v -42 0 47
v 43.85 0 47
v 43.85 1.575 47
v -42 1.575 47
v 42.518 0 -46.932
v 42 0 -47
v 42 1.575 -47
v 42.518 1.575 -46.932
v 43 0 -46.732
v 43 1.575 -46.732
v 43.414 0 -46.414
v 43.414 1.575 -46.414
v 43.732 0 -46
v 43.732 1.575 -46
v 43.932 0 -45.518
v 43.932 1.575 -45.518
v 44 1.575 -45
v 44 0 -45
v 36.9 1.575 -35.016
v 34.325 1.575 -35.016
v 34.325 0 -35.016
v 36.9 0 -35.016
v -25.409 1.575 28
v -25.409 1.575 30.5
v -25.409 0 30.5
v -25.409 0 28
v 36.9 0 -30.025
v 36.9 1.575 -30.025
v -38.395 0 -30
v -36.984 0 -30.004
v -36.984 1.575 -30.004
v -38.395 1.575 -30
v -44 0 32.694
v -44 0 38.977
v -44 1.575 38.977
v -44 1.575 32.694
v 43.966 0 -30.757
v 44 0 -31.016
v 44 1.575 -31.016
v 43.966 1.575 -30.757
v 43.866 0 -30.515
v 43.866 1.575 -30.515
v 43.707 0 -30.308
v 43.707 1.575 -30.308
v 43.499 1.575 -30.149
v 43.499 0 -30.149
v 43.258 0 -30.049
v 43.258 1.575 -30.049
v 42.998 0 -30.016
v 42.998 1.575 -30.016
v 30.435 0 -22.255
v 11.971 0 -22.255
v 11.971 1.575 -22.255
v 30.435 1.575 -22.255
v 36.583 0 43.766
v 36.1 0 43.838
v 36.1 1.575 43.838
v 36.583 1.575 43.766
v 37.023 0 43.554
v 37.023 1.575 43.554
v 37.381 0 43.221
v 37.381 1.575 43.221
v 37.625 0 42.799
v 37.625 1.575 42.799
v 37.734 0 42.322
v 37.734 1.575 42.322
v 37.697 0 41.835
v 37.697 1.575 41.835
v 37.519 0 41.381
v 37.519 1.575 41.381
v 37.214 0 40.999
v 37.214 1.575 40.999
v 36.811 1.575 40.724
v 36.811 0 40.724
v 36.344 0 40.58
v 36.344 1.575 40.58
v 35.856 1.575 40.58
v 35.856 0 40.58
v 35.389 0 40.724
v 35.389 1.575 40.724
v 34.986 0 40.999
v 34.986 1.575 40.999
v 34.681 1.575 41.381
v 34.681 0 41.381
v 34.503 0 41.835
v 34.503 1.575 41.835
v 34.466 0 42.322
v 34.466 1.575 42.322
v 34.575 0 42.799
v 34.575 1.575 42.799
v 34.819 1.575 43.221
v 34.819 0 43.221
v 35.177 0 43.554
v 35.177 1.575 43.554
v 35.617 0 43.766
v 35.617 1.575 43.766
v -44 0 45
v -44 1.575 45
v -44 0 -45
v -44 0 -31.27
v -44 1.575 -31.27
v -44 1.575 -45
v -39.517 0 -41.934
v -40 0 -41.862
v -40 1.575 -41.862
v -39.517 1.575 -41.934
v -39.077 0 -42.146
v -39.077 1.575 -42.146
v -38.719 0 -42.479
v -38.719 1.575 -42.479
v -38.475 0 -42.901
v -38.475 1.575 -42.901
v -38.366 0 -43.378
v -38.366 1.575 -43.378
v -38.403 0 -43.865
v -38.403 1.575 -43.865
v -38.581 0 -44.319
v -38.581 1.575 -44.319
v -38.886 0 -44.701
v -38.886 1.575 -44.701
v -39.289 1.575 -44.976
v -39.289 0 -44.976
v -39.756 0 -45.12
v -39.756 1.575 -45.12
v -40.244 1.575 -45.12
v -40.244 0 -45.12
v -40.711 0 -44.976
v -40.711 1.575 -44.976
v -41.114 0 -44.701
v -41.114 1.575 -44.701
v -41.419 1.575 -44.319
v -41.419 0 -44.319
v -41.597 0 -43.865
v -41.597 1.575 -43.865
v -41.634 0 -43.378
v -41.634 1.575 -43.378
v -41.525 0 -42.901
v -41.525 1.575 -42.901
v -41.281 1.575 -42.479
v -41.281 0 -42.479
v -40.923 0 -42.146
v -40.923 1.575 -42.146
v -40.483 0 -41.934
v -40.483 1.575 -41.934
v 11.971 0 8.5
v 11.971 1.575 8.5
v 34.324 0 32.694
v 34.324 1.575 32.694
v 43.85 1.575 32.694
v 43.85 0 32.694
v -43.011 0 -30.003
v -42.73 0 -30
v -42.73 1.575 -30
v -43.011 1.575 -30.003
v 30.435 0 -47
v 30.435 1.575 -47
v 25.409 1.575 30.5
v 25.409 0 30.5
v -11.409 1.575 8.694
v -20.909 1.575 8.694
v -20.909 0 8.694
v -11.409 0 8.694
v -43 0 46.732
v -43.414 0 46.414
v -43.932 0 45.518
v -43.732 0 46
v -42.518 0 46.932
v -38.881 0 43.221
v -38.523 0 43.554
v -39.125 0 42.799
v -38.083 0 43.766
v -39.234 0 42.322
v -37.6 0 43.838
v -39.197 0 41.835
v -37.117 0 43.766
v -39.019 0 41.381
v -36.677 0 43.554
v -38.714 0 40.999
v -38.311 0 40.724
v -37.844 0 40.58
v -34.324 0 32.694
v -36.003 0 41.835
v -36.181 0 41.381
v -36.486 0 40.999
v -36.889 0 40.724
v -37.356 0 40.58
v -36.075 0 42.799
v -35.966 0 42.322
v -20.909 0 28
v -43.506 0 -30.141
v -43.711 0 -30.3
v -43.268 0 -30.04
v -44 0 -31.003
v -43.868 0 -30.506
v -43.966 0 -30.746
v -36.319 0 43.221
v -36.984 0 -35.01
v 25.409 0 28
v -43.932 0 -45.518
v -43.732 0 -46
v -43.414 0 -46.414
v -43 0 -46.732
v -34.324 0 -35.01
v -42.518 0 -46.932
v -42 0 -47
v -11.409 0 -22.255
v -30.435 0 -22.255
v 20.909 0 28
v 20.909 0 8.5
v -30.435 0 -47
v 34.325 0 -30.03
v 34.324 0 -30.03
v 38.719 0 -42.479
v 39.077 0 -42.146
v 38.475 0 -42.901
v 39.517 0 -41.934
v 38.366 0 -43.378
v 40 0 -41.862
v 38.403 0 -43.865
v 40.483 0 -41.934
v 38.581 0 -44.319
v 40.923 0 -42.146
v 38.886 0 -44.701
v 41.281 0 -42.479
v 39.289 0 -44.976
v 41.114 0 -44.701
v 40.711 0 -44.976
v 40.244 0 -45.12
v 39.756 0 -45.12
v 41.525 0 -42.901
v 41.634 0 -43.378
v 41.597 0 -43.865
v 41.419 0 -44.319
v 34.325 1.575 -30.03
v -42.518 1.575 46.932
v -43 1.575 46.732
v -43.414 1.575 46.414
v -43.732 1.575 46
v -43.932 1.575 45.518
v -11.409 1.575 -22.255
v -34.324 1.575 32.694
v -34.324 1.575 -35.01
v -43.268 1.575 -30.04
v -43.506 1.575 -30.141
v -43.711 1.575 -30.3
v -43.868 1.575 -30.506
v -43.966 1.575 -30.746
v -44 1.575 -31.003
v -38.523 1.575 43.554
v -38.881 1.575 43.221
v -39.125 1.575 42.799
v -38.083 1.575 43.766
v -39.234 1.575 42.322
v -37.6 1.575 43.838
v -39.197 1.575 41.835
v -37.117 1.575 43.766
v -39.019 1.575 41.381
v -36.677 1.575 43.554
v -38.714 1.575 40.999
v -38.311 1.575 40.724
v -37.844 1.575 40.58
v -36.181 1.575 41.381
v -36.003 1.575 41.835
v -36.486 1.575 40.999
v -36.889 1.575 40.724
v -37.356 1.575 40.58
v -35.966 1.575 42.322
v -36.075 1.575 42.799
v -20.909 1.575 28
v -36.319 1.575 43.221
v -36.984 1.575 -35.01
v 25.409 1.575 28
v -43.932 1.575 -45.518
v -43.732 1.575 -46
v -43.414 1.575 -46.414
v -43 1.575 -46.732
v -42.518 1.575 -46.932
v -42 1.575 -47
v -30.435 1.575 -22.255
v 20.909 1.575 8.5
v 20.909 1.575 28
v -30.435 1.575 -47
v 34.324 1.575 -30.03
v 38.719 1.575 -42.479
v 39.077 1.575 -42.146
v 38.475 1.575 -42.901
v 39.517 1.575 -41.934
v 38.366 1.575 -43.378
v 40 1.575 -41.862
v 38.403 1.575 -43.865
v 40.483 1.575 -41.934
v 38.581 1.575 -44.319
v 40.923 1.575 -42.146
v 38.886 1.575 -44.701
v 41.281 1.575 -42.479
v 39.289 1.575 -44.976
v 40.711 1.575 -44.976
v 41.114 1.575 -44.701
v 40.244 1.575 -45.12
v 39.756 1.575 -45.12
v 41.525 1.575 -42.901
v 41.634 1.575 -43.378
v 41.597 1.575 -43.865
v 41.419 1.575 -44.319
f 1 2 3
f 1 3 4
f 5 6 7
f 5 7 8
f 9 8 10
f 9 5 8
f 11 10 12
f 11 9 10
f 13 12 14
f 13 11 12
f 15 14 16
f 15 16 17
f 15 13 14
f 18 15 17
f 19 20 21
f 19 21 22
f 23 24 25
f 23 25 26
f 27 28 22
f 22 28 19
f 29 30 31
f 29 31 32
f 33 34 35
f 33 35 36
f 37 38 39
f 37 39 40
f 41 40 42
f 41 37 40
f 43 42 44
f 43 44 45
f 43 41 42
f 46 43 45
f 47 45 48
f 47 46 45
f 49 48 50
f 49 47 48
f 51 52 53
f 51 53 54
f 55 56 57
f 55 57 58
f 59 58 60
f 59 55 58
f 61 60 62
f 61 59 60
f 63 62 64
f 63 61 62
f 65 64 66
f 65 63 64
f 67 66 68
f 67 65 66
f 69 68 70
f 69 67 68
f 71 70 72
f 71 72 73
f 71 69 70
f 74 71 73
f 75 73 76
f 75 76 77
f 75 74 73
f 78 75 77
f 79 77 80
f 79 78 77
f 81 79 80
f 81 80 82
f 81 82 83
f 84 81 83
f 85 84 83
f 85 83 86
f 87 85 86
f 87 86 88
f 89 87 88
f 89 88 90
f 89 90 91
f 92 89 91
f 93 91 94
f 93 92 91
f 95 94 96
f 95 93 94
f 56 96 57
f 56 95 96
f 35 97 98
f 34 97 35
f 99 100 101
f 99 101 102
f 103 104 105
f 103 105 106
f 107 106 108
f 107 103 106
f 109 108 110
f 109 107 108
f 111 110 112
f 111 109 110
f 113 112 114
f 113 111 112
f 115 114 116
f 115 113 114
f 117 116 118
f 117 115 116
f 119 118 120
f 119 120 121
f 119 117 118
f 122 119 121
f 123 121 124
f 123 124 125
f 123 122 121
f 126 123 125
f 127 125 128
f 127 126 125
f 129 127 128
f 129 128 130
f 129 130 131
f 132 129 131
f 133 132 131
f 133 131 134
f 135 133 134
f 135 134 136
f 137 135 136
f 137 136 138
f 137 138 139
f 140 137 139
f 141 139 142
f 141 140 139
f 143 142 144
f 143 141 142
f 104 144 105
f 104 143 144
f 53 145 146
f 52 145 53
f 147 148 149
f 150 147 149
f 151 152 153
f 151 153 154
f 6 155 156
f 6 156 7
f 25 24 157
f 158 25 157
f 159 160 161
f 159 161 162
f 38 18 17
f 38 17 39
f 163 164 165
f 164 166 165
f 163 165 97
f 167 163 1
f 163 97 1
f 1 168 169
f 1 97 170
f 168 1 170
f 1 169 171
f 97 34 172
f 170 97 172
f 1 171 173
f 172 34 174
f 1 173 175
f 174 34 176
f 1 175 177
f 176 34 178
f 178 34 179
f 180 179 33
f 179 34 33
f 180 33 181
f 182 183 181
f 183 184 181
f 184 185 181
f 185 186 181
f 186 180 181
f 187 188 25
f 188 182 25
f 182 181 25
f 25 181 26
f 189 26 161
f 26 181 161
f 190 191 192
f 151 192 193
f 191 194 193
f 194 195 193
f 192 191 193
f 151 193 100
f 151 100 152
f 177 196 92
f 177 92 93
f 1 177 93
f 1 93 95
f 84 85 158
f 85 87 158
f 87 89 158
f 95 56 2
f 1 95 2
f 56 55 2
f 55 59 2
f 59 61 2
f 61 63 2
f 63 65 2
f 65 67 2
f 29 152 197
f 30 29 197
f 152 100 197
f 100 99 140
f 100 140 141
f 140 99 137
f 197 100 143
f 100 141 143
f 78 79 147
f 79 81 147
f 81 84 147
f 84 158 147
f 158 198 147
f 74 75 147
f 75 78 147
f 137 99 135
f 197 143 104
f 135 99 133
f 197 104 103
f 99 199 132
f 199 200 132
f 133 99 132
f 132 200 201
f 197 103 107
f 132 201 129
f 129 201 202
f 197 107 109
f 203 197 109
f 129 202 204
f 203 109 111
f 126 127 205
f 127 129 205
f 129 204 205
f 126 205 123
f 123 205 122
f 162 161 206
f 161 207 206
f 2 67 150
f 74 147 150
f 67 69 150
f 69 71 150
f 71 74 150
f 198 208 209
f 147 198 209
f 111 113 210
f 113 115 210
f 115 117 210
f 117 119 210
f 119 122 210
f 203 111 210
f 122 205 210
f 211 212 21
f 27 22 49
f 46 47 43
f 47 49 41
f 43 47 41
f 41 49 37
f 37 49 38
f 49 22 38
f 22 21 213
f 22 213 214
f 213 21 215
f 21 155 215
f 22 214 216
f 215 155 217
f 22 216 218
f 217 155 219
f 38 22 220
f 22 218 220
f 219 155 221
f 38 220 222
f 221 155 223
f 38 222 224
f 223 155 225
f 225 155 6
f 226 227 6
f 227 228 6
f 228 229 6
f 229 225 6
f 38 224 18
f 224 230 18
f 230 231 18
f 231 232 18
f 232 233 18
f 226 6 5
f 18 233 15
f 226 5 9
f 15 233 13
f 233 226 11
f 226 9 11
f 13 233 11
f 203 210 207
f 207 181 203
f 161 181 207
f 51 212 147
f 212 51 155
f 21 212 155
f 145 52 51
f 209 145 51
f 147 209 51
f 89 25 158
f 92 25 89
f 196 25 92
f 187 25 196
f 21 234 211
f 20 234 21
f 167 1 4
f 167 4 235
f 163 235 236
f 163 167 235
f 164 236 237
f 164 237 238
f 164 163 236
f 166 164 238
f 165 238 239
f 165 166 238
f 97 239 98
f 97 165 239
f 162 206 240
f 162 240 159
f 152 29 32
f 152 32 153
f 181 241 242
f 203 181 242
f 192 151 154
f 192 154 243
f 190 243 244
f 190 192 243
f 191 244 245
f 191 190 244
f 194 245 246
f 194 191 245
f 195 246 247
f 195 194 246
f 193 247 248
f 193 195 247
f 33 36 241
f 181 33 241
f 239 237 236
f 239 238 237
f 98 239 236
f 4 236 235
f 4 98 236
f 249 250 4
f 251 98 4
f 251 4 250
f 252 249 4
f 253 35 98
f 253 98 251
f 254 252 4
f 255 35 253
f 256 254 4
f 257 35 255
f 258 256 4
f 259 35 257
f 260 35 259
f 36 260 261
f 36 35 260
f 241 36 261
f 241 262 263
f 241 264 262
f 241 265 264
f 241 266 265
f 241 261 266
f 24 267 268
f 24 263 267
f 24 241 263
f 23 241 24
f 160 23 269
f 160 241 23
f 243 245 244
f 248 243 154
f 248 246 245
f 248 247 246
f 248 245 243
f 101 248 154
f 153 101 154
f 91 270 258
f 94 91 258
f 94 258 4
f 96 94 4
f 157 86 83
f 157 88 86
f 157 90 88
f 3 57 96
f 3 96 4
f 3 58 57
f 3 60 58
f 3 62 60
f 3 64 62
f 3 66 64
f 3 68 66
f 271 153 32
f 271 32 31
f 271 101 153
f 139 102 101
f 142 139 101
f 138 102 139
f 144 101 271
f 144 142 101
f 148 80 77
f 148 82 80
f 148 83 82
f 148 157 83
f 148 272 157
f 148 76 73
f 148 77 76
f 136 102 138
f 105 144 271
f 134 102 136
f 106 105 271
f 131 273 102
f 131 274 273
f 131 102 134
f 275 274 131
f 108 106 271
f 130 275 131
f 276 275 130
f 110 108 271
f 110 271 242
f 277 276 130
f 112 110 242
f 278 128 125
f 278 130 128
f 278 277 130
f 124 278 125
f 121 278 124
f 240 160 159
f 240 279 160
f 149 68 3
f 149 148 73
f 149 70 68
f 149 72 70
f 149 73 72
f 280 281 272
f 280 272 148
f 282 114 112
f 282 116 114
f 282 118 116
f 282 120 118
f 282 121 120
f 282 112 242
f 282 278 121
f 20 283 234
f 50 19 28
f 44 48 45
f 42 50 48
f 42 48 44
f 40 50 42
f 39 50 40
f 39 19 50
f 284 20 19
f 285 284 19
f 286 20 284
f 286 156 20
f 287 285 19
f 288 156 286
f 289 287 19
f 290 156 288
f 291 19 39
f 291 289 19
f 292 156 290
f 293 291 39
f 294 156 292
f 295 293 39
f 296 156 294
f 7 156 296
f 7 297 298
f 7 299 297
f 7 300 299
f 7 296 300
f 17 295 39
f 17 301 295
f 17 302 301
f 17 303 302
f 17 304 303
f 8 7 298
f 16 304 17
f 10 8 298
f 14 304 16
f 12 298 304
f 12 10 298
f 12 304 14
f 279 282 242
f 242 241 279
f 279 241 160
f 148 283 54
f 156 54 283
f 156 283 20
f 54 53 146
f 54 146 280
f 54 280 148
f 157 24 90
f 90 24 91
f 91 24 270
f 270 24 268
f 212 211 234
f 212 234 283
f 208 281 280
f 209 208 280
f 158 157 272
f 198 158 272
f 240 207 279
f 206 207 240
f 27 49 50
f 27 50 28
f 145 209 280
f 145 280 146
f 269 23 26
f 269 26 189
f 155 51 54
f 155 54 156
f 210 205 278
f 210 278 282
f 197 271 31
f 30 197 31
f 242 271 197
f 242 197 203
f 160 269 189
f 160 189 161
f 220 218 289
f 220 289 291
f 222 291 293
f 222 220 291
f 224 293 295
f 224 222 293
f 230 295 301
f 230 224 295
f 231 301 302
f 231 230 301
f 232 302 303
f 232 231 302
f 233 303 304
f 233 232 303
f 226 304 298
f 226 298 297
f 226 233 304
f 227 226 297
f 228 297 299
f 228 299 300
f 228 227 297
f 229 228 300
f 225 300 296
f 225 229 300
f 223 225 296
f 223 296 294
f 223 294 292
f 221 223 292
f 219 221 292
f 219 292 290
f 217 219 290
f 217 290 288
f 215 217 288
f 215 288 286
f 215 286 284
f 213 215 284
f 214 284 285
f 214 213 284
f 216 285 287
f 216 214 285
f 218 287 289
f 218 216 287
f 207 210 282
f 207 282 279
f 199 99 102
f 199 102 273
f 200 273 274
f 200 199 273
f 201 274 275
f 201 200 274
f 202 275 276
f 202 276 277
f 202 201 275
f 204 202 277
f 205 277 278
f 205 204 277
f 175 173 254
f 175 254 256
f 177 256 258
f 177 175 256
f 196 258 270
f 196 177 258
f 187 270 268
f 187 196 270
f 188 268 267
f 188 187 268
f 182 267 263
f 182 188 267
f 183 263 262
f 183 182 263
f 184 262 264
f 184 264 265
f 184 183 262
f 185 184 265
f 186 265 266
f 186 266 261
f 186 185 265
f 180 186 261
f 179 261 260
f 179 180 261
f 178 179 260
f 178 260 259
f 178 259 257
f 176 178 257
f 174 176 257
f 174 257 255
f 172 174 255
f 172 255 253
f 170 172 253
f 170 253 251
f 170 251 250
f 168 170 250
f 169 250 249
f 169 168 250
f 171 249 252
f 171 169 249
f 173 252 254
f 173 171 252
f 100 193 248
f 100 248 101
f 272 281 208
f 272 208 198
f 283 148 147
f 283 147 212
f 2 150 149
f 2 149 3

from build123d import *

# Parameters (mm, degrees)
SKETCH1_2_R                 = 1.6383
BOSS_EXTRUDE2_DEPTH         = 1.575
SKETCH2_W                   = 14.080651801
SKETCH2_H                   = 7.11628052
SKETCH2_W_2                 = 15.007196354
SKETCH2_H_2                 = 9.421332762
CUT_EXTRUDE1_DEPTH          = 65.400942629
ADDITIONAL_PCB_MATERIAL_W   = 2.649520344
ADDITIONAL_PCB_MATERIAL_H   = 65.213315835
ADDITIONAL_PCB_MATERIAL_W_2 = 1.5
ADDITIONAL_PCB_MATERIAL_H_2 = 65.299191064
BOSS_EXTRUDE3_DEPTH         = 1.575
SKETCH3_W                   = 46.818
SKETCH3_H                   = 1
BOSS_EXTRUDE4_DEPTH         = 1.575
SKETCH4_W                   = 2
SKETCH4_H                   = 2.5
CUT_EXTRUDE2_DEPTH          = 65.400942629
SKETCH5_W                   = 2.5
SKETCH5_H                   = 18.09999695
SKETCH5_H_2                 = 19.499999394
BOSS_EXTRUDE5_DEPTH         = 1.575
SKETCH7_W                   = 9.5
SKETCH7_H                   = 1.20600305
CUT_EXTRUDE3_DEPTH          = 65.400942629
SKETCH26_W                  = 2.575
SKETCH26_H                  = 5
CUT_EXTRUDE4_DEPTH          = 10


with BuildPart() as part:
    # Sketch1<2> → Boss-Extrude2 (new body)
    with BuildSketch(Plane(origin=(0, 0, 0), x_dir=(1, 0, 0), z_dir=(0, 1, 0))):
        with BuildLine():
            Line((-38.39500299, 29.999999735), (-42.73000299, 29.999999735))
            Line((-42.73000299, 29.999999735), (-43.011025994, 30.003097626))
            ThreePointArc((-43.011025994, 30.003097626), (-43.710996344, 30.299838092), (-44.000003042, 31.003036872))
            Line((-44.000003042, 31.003036872), (-44.000003042, 31.269999735))
            Line((-44.000003042, 31.269999735), (-44.000005679, 44.999999735))
            ThreePointArc((-44.000005679, 44.999999735), (-43.414218633, 46.414215608), (-42.000002924, 47.000003051))
            Line((-42.000002924, 47.000003051), (-30.435003, 47.000003051))
            Line((-30.435003, 47.000003051), (-30.435003, 22.255357341))
            Line((-30.435003, 22.255357341), (-11.409003, 22.255357341))
            Line((-11.409003, 22.255357341), (-11.409003, -9.899999999))
            Line((-11.409003, -9.899999999), (-23.409003, -9.899999999))
            Line((-23.409003, -9.899999999), (-23.409003, -31.499996949))
            Line((-23.409003, -31.499996949), (23.408997, -31.499996949))
            Line((23.408997, -31.499996949), (23.408997, -8.499997555))
            Line((23.408997, -8.499997555), (11.97084713, -8.499997555))
            Line((11.97084713, -8.499997555), (11.97084713, 22.255357341))
            Line((11.97084713, 22.255357341), (30.434997, 22.255357341))
            Line((30.434997, 22.255357341), (30.434997, 47.000003051))
            Line((30.434997, 47.000003051), (42.000008541, 47.000003051))
            ThreePointArc((42.000008541, 47.000003051), (43.414213215, 46.414220704), (43.999996956, 45.000016607))
            Line((43.999996956, 45.000016607), (43.999996956, 32.000003378))
            Line((43.999996956, 32.000003378), (43.999996956, 31.015615364))
            ThreePointArc((43.999996956, 31.015615364), (43.706534093, 30.307939396), (42.998386406, 30.015616661))
            Line((42.998386406, 30.015616661), (33.825607551, 30.030389905))
            ThreePointArc((33.825607551, 30.030389905), (33.117459864, 29.738067169), (32.823997, 29.030391202))
            Line((32.823997, 29.030391202), (32.823997, -30.453996949))
            ThreePointArc((32.823997, -30.453996949), (33.116890219, -31.16110373), (33.823997, -31.453996949))
            Line((33.823997, -31.453996949), (36.099999555, -31.453996949))
            Line((36.099999555, -31.453996949), (42.849728118, -31.453996949))
            ThreePointArc((42.849728118, -31.453996949), (43.556834899, -31.746890168), (43.849728118, -32.453996949))
            Line((43.849728118, -32.453996949), (43.849728118, -36.999996949))
            Line((43.849728118, -36.999996949), (43.849728118, -46.999996949))
            Line((43.849728118, -46.999996949), (-42.000000178, -46.999996949))
            ThreePointArc((-42.000000178, -46.999996949), (-43.414212804, -46.414211581), (-44.000000499, -44.999999921))
            Line((-44.000000499, -44.999999921), (-44.000000178, -38.976999921))
            Line((-44.000000178, -38.976999921), (-44.000000178, -32.453999802))
            ThreePointArc((-44.000000178, -32.453999802), (-43.70710696, -31.746893021), (-43.000000178, -31.453999802))
            Line((-43.000000178, -31.453999802), (-36.100000549, -31.453999802))
            Line((-36.100000549, -31.453999802), (-33.824003042, -31.453999802))
            ThreePointArc((-33.824003042, -31.453999802), (-33.116896261, -31.161106583), (-32.824003042, -30.453999802))
            Line((-32.824003042, -30.453999802), (-32.824003042, 29.011483943))
            ThreePointArc((-32.824003042, 29.011483943), (-33.117785331, 29.719478678), (-33.826516131, 30.011480785))
            Line((-33.826516131, 30.011480785), (-38.39500299, 29.999999735))
        make_face()
        with Locations((40, 43.5)):
            Circle(SKETCH1_2_R, mode=Mode.SUBTRACT)
        with Locations((-40, 43.5)):
            Circle(SKETCH1_2_R, mode=Mode.SUBTRACT)
        with Locations((-37.6, -42.2)):
            Circle(SKETCH1_2_R, mode=Mode.SUBTRACT)
        with Locations((36.1, -42.2)):
            Circle(SKETCH1_2_R, mode=Mode.SUBTRACT)
    extrude(amount=BOSS_EXTRUDE2_DEPTH)

    # Sketch2 → Cut-Extrude1 (cut, through all)
    with BuildSketch(Plane(origin=(0, 1.575, 0), x_dir=(1, 0, 0), z_dir=(0, 1, 0))):
        with Locations((39.863054019, -29.135856689)):
            Rectangle(SKETCH2_W, SKETCH2_H)
        with Locations((-40.336598676, -27.983330568)):
            Rectangle(SKETCH2_W_2, SKETCH2_H_2)
    extrude(amount=-CUT_EXTRUDE1_DEPTH, mode=Mode.SUBTRACT)

    # Additional PCB material → Boss-Extrude3 (add)
    with BuildSketch(Plane(origin=(0, 1.575, 0), x_dir=(1, 0, 0), z_dir=(0, 1, 0))):
        with Locations((32.999236828, -1.128517583)):
            Rectangle(ADDITIONAL_PCB_MATERIAL_W, ADDITIONAL_PCB_MATERIAL_H)
        with Locations((-33.574003042, -1.085579968)):
            Rectangle(ADDITIONAL_PCB_MATERIAL_W_2, ADDITIONAL_PCB_MATERIAL_H_2)
    extrude(amount=-BOSS_EXTRUDE3_DEPTH)

    # Sketch3 → Boss-Extrude4 (add)
    with BuildSketch(Plane(origin=(0, 1.575, 0), x_dir=(1, 0, 0), z_dir=(0, 1, 0))):
        with Locations((-3e-06, -30.999996949)):
            Rectangle(SKETCH3_W, SKETCH3_H)
    extrude(amount=-BOSS_EXTRUDE4_DEPTH)

    # Sketch4 → Cut-Extrude2 (cut, through all)
    with BuildSketch(Plane(origin=(0, 1.575, 0), x_dir=(1, 0, 0), z_dir=(0, 1, 0))):
        with Locations((24.408997, -29.249996949)):
            Rectangle(SKETCH4_W, SKETCH4_H)
        with Locations((-24.409003, -29.249996949)):
            Rectangle(SKETCH4_W, SKETCH4_H)
    extrude(amount=-CUT_EXTRUDE2_DEPTH, mode=Mode.SUBTRACT)

    # Sketch5 → Boss-Extrude5 (add)
    with BuildSketch(Plane(origin=(0, 1.575, 0), x_dir=(1, 0, 0), z_dir=(0, 1, 0))):
        with Locations((-22.159003, -18.949998474)):
            Rectangle(SKETCH5_W, SKETCH5_H)
        with Locations((22.158997, -18.249997252)):
            Rectangle(SKETCH5_W, SKETCH5_H_2)
    extrude(amount=-BOSS_EXTRUDE5_DEPTH)

    # Sketch7 → Cut-Extrude3 (cut, through all)
    with BuildSketch(Plane(origin=(0, 1.575, 0), x_dir=(1, 0, 0), z_dir=(0, 1, 0))):
        with Locations((-16.159003, -9.296998474)):
            Rectangle(SKETCH7_W, SKETCH7_H)
    extrude(amount=-CUT_EXTRUDE3_DEPTH, mode=Mode.SUBTRACT)

    # Sketch26 → Cut-Extrude4 (cut)
    with BuildSketch(Plane(origin=(0, 1.575, 0), x_dir=(1, 0, 0), z_dir=(0, 1, 0))):
        Polygon((-36.984003042, 35.010230552), (-34.324003042, 35.010230552), (-34.324003042, 29.927765717), (-36.984003042, 29.927765717), (-36.984003042, 30.010230552), align=None)
        with Locations((35.612496956, 32.515616661)):
            Rectangle(SKETCH26_W, SKETCH26_H)
    extrude(amount=-CUT_EXTRUDE4_DEPTH, mode=Mode.SUBTRACT)


solid = part.part
